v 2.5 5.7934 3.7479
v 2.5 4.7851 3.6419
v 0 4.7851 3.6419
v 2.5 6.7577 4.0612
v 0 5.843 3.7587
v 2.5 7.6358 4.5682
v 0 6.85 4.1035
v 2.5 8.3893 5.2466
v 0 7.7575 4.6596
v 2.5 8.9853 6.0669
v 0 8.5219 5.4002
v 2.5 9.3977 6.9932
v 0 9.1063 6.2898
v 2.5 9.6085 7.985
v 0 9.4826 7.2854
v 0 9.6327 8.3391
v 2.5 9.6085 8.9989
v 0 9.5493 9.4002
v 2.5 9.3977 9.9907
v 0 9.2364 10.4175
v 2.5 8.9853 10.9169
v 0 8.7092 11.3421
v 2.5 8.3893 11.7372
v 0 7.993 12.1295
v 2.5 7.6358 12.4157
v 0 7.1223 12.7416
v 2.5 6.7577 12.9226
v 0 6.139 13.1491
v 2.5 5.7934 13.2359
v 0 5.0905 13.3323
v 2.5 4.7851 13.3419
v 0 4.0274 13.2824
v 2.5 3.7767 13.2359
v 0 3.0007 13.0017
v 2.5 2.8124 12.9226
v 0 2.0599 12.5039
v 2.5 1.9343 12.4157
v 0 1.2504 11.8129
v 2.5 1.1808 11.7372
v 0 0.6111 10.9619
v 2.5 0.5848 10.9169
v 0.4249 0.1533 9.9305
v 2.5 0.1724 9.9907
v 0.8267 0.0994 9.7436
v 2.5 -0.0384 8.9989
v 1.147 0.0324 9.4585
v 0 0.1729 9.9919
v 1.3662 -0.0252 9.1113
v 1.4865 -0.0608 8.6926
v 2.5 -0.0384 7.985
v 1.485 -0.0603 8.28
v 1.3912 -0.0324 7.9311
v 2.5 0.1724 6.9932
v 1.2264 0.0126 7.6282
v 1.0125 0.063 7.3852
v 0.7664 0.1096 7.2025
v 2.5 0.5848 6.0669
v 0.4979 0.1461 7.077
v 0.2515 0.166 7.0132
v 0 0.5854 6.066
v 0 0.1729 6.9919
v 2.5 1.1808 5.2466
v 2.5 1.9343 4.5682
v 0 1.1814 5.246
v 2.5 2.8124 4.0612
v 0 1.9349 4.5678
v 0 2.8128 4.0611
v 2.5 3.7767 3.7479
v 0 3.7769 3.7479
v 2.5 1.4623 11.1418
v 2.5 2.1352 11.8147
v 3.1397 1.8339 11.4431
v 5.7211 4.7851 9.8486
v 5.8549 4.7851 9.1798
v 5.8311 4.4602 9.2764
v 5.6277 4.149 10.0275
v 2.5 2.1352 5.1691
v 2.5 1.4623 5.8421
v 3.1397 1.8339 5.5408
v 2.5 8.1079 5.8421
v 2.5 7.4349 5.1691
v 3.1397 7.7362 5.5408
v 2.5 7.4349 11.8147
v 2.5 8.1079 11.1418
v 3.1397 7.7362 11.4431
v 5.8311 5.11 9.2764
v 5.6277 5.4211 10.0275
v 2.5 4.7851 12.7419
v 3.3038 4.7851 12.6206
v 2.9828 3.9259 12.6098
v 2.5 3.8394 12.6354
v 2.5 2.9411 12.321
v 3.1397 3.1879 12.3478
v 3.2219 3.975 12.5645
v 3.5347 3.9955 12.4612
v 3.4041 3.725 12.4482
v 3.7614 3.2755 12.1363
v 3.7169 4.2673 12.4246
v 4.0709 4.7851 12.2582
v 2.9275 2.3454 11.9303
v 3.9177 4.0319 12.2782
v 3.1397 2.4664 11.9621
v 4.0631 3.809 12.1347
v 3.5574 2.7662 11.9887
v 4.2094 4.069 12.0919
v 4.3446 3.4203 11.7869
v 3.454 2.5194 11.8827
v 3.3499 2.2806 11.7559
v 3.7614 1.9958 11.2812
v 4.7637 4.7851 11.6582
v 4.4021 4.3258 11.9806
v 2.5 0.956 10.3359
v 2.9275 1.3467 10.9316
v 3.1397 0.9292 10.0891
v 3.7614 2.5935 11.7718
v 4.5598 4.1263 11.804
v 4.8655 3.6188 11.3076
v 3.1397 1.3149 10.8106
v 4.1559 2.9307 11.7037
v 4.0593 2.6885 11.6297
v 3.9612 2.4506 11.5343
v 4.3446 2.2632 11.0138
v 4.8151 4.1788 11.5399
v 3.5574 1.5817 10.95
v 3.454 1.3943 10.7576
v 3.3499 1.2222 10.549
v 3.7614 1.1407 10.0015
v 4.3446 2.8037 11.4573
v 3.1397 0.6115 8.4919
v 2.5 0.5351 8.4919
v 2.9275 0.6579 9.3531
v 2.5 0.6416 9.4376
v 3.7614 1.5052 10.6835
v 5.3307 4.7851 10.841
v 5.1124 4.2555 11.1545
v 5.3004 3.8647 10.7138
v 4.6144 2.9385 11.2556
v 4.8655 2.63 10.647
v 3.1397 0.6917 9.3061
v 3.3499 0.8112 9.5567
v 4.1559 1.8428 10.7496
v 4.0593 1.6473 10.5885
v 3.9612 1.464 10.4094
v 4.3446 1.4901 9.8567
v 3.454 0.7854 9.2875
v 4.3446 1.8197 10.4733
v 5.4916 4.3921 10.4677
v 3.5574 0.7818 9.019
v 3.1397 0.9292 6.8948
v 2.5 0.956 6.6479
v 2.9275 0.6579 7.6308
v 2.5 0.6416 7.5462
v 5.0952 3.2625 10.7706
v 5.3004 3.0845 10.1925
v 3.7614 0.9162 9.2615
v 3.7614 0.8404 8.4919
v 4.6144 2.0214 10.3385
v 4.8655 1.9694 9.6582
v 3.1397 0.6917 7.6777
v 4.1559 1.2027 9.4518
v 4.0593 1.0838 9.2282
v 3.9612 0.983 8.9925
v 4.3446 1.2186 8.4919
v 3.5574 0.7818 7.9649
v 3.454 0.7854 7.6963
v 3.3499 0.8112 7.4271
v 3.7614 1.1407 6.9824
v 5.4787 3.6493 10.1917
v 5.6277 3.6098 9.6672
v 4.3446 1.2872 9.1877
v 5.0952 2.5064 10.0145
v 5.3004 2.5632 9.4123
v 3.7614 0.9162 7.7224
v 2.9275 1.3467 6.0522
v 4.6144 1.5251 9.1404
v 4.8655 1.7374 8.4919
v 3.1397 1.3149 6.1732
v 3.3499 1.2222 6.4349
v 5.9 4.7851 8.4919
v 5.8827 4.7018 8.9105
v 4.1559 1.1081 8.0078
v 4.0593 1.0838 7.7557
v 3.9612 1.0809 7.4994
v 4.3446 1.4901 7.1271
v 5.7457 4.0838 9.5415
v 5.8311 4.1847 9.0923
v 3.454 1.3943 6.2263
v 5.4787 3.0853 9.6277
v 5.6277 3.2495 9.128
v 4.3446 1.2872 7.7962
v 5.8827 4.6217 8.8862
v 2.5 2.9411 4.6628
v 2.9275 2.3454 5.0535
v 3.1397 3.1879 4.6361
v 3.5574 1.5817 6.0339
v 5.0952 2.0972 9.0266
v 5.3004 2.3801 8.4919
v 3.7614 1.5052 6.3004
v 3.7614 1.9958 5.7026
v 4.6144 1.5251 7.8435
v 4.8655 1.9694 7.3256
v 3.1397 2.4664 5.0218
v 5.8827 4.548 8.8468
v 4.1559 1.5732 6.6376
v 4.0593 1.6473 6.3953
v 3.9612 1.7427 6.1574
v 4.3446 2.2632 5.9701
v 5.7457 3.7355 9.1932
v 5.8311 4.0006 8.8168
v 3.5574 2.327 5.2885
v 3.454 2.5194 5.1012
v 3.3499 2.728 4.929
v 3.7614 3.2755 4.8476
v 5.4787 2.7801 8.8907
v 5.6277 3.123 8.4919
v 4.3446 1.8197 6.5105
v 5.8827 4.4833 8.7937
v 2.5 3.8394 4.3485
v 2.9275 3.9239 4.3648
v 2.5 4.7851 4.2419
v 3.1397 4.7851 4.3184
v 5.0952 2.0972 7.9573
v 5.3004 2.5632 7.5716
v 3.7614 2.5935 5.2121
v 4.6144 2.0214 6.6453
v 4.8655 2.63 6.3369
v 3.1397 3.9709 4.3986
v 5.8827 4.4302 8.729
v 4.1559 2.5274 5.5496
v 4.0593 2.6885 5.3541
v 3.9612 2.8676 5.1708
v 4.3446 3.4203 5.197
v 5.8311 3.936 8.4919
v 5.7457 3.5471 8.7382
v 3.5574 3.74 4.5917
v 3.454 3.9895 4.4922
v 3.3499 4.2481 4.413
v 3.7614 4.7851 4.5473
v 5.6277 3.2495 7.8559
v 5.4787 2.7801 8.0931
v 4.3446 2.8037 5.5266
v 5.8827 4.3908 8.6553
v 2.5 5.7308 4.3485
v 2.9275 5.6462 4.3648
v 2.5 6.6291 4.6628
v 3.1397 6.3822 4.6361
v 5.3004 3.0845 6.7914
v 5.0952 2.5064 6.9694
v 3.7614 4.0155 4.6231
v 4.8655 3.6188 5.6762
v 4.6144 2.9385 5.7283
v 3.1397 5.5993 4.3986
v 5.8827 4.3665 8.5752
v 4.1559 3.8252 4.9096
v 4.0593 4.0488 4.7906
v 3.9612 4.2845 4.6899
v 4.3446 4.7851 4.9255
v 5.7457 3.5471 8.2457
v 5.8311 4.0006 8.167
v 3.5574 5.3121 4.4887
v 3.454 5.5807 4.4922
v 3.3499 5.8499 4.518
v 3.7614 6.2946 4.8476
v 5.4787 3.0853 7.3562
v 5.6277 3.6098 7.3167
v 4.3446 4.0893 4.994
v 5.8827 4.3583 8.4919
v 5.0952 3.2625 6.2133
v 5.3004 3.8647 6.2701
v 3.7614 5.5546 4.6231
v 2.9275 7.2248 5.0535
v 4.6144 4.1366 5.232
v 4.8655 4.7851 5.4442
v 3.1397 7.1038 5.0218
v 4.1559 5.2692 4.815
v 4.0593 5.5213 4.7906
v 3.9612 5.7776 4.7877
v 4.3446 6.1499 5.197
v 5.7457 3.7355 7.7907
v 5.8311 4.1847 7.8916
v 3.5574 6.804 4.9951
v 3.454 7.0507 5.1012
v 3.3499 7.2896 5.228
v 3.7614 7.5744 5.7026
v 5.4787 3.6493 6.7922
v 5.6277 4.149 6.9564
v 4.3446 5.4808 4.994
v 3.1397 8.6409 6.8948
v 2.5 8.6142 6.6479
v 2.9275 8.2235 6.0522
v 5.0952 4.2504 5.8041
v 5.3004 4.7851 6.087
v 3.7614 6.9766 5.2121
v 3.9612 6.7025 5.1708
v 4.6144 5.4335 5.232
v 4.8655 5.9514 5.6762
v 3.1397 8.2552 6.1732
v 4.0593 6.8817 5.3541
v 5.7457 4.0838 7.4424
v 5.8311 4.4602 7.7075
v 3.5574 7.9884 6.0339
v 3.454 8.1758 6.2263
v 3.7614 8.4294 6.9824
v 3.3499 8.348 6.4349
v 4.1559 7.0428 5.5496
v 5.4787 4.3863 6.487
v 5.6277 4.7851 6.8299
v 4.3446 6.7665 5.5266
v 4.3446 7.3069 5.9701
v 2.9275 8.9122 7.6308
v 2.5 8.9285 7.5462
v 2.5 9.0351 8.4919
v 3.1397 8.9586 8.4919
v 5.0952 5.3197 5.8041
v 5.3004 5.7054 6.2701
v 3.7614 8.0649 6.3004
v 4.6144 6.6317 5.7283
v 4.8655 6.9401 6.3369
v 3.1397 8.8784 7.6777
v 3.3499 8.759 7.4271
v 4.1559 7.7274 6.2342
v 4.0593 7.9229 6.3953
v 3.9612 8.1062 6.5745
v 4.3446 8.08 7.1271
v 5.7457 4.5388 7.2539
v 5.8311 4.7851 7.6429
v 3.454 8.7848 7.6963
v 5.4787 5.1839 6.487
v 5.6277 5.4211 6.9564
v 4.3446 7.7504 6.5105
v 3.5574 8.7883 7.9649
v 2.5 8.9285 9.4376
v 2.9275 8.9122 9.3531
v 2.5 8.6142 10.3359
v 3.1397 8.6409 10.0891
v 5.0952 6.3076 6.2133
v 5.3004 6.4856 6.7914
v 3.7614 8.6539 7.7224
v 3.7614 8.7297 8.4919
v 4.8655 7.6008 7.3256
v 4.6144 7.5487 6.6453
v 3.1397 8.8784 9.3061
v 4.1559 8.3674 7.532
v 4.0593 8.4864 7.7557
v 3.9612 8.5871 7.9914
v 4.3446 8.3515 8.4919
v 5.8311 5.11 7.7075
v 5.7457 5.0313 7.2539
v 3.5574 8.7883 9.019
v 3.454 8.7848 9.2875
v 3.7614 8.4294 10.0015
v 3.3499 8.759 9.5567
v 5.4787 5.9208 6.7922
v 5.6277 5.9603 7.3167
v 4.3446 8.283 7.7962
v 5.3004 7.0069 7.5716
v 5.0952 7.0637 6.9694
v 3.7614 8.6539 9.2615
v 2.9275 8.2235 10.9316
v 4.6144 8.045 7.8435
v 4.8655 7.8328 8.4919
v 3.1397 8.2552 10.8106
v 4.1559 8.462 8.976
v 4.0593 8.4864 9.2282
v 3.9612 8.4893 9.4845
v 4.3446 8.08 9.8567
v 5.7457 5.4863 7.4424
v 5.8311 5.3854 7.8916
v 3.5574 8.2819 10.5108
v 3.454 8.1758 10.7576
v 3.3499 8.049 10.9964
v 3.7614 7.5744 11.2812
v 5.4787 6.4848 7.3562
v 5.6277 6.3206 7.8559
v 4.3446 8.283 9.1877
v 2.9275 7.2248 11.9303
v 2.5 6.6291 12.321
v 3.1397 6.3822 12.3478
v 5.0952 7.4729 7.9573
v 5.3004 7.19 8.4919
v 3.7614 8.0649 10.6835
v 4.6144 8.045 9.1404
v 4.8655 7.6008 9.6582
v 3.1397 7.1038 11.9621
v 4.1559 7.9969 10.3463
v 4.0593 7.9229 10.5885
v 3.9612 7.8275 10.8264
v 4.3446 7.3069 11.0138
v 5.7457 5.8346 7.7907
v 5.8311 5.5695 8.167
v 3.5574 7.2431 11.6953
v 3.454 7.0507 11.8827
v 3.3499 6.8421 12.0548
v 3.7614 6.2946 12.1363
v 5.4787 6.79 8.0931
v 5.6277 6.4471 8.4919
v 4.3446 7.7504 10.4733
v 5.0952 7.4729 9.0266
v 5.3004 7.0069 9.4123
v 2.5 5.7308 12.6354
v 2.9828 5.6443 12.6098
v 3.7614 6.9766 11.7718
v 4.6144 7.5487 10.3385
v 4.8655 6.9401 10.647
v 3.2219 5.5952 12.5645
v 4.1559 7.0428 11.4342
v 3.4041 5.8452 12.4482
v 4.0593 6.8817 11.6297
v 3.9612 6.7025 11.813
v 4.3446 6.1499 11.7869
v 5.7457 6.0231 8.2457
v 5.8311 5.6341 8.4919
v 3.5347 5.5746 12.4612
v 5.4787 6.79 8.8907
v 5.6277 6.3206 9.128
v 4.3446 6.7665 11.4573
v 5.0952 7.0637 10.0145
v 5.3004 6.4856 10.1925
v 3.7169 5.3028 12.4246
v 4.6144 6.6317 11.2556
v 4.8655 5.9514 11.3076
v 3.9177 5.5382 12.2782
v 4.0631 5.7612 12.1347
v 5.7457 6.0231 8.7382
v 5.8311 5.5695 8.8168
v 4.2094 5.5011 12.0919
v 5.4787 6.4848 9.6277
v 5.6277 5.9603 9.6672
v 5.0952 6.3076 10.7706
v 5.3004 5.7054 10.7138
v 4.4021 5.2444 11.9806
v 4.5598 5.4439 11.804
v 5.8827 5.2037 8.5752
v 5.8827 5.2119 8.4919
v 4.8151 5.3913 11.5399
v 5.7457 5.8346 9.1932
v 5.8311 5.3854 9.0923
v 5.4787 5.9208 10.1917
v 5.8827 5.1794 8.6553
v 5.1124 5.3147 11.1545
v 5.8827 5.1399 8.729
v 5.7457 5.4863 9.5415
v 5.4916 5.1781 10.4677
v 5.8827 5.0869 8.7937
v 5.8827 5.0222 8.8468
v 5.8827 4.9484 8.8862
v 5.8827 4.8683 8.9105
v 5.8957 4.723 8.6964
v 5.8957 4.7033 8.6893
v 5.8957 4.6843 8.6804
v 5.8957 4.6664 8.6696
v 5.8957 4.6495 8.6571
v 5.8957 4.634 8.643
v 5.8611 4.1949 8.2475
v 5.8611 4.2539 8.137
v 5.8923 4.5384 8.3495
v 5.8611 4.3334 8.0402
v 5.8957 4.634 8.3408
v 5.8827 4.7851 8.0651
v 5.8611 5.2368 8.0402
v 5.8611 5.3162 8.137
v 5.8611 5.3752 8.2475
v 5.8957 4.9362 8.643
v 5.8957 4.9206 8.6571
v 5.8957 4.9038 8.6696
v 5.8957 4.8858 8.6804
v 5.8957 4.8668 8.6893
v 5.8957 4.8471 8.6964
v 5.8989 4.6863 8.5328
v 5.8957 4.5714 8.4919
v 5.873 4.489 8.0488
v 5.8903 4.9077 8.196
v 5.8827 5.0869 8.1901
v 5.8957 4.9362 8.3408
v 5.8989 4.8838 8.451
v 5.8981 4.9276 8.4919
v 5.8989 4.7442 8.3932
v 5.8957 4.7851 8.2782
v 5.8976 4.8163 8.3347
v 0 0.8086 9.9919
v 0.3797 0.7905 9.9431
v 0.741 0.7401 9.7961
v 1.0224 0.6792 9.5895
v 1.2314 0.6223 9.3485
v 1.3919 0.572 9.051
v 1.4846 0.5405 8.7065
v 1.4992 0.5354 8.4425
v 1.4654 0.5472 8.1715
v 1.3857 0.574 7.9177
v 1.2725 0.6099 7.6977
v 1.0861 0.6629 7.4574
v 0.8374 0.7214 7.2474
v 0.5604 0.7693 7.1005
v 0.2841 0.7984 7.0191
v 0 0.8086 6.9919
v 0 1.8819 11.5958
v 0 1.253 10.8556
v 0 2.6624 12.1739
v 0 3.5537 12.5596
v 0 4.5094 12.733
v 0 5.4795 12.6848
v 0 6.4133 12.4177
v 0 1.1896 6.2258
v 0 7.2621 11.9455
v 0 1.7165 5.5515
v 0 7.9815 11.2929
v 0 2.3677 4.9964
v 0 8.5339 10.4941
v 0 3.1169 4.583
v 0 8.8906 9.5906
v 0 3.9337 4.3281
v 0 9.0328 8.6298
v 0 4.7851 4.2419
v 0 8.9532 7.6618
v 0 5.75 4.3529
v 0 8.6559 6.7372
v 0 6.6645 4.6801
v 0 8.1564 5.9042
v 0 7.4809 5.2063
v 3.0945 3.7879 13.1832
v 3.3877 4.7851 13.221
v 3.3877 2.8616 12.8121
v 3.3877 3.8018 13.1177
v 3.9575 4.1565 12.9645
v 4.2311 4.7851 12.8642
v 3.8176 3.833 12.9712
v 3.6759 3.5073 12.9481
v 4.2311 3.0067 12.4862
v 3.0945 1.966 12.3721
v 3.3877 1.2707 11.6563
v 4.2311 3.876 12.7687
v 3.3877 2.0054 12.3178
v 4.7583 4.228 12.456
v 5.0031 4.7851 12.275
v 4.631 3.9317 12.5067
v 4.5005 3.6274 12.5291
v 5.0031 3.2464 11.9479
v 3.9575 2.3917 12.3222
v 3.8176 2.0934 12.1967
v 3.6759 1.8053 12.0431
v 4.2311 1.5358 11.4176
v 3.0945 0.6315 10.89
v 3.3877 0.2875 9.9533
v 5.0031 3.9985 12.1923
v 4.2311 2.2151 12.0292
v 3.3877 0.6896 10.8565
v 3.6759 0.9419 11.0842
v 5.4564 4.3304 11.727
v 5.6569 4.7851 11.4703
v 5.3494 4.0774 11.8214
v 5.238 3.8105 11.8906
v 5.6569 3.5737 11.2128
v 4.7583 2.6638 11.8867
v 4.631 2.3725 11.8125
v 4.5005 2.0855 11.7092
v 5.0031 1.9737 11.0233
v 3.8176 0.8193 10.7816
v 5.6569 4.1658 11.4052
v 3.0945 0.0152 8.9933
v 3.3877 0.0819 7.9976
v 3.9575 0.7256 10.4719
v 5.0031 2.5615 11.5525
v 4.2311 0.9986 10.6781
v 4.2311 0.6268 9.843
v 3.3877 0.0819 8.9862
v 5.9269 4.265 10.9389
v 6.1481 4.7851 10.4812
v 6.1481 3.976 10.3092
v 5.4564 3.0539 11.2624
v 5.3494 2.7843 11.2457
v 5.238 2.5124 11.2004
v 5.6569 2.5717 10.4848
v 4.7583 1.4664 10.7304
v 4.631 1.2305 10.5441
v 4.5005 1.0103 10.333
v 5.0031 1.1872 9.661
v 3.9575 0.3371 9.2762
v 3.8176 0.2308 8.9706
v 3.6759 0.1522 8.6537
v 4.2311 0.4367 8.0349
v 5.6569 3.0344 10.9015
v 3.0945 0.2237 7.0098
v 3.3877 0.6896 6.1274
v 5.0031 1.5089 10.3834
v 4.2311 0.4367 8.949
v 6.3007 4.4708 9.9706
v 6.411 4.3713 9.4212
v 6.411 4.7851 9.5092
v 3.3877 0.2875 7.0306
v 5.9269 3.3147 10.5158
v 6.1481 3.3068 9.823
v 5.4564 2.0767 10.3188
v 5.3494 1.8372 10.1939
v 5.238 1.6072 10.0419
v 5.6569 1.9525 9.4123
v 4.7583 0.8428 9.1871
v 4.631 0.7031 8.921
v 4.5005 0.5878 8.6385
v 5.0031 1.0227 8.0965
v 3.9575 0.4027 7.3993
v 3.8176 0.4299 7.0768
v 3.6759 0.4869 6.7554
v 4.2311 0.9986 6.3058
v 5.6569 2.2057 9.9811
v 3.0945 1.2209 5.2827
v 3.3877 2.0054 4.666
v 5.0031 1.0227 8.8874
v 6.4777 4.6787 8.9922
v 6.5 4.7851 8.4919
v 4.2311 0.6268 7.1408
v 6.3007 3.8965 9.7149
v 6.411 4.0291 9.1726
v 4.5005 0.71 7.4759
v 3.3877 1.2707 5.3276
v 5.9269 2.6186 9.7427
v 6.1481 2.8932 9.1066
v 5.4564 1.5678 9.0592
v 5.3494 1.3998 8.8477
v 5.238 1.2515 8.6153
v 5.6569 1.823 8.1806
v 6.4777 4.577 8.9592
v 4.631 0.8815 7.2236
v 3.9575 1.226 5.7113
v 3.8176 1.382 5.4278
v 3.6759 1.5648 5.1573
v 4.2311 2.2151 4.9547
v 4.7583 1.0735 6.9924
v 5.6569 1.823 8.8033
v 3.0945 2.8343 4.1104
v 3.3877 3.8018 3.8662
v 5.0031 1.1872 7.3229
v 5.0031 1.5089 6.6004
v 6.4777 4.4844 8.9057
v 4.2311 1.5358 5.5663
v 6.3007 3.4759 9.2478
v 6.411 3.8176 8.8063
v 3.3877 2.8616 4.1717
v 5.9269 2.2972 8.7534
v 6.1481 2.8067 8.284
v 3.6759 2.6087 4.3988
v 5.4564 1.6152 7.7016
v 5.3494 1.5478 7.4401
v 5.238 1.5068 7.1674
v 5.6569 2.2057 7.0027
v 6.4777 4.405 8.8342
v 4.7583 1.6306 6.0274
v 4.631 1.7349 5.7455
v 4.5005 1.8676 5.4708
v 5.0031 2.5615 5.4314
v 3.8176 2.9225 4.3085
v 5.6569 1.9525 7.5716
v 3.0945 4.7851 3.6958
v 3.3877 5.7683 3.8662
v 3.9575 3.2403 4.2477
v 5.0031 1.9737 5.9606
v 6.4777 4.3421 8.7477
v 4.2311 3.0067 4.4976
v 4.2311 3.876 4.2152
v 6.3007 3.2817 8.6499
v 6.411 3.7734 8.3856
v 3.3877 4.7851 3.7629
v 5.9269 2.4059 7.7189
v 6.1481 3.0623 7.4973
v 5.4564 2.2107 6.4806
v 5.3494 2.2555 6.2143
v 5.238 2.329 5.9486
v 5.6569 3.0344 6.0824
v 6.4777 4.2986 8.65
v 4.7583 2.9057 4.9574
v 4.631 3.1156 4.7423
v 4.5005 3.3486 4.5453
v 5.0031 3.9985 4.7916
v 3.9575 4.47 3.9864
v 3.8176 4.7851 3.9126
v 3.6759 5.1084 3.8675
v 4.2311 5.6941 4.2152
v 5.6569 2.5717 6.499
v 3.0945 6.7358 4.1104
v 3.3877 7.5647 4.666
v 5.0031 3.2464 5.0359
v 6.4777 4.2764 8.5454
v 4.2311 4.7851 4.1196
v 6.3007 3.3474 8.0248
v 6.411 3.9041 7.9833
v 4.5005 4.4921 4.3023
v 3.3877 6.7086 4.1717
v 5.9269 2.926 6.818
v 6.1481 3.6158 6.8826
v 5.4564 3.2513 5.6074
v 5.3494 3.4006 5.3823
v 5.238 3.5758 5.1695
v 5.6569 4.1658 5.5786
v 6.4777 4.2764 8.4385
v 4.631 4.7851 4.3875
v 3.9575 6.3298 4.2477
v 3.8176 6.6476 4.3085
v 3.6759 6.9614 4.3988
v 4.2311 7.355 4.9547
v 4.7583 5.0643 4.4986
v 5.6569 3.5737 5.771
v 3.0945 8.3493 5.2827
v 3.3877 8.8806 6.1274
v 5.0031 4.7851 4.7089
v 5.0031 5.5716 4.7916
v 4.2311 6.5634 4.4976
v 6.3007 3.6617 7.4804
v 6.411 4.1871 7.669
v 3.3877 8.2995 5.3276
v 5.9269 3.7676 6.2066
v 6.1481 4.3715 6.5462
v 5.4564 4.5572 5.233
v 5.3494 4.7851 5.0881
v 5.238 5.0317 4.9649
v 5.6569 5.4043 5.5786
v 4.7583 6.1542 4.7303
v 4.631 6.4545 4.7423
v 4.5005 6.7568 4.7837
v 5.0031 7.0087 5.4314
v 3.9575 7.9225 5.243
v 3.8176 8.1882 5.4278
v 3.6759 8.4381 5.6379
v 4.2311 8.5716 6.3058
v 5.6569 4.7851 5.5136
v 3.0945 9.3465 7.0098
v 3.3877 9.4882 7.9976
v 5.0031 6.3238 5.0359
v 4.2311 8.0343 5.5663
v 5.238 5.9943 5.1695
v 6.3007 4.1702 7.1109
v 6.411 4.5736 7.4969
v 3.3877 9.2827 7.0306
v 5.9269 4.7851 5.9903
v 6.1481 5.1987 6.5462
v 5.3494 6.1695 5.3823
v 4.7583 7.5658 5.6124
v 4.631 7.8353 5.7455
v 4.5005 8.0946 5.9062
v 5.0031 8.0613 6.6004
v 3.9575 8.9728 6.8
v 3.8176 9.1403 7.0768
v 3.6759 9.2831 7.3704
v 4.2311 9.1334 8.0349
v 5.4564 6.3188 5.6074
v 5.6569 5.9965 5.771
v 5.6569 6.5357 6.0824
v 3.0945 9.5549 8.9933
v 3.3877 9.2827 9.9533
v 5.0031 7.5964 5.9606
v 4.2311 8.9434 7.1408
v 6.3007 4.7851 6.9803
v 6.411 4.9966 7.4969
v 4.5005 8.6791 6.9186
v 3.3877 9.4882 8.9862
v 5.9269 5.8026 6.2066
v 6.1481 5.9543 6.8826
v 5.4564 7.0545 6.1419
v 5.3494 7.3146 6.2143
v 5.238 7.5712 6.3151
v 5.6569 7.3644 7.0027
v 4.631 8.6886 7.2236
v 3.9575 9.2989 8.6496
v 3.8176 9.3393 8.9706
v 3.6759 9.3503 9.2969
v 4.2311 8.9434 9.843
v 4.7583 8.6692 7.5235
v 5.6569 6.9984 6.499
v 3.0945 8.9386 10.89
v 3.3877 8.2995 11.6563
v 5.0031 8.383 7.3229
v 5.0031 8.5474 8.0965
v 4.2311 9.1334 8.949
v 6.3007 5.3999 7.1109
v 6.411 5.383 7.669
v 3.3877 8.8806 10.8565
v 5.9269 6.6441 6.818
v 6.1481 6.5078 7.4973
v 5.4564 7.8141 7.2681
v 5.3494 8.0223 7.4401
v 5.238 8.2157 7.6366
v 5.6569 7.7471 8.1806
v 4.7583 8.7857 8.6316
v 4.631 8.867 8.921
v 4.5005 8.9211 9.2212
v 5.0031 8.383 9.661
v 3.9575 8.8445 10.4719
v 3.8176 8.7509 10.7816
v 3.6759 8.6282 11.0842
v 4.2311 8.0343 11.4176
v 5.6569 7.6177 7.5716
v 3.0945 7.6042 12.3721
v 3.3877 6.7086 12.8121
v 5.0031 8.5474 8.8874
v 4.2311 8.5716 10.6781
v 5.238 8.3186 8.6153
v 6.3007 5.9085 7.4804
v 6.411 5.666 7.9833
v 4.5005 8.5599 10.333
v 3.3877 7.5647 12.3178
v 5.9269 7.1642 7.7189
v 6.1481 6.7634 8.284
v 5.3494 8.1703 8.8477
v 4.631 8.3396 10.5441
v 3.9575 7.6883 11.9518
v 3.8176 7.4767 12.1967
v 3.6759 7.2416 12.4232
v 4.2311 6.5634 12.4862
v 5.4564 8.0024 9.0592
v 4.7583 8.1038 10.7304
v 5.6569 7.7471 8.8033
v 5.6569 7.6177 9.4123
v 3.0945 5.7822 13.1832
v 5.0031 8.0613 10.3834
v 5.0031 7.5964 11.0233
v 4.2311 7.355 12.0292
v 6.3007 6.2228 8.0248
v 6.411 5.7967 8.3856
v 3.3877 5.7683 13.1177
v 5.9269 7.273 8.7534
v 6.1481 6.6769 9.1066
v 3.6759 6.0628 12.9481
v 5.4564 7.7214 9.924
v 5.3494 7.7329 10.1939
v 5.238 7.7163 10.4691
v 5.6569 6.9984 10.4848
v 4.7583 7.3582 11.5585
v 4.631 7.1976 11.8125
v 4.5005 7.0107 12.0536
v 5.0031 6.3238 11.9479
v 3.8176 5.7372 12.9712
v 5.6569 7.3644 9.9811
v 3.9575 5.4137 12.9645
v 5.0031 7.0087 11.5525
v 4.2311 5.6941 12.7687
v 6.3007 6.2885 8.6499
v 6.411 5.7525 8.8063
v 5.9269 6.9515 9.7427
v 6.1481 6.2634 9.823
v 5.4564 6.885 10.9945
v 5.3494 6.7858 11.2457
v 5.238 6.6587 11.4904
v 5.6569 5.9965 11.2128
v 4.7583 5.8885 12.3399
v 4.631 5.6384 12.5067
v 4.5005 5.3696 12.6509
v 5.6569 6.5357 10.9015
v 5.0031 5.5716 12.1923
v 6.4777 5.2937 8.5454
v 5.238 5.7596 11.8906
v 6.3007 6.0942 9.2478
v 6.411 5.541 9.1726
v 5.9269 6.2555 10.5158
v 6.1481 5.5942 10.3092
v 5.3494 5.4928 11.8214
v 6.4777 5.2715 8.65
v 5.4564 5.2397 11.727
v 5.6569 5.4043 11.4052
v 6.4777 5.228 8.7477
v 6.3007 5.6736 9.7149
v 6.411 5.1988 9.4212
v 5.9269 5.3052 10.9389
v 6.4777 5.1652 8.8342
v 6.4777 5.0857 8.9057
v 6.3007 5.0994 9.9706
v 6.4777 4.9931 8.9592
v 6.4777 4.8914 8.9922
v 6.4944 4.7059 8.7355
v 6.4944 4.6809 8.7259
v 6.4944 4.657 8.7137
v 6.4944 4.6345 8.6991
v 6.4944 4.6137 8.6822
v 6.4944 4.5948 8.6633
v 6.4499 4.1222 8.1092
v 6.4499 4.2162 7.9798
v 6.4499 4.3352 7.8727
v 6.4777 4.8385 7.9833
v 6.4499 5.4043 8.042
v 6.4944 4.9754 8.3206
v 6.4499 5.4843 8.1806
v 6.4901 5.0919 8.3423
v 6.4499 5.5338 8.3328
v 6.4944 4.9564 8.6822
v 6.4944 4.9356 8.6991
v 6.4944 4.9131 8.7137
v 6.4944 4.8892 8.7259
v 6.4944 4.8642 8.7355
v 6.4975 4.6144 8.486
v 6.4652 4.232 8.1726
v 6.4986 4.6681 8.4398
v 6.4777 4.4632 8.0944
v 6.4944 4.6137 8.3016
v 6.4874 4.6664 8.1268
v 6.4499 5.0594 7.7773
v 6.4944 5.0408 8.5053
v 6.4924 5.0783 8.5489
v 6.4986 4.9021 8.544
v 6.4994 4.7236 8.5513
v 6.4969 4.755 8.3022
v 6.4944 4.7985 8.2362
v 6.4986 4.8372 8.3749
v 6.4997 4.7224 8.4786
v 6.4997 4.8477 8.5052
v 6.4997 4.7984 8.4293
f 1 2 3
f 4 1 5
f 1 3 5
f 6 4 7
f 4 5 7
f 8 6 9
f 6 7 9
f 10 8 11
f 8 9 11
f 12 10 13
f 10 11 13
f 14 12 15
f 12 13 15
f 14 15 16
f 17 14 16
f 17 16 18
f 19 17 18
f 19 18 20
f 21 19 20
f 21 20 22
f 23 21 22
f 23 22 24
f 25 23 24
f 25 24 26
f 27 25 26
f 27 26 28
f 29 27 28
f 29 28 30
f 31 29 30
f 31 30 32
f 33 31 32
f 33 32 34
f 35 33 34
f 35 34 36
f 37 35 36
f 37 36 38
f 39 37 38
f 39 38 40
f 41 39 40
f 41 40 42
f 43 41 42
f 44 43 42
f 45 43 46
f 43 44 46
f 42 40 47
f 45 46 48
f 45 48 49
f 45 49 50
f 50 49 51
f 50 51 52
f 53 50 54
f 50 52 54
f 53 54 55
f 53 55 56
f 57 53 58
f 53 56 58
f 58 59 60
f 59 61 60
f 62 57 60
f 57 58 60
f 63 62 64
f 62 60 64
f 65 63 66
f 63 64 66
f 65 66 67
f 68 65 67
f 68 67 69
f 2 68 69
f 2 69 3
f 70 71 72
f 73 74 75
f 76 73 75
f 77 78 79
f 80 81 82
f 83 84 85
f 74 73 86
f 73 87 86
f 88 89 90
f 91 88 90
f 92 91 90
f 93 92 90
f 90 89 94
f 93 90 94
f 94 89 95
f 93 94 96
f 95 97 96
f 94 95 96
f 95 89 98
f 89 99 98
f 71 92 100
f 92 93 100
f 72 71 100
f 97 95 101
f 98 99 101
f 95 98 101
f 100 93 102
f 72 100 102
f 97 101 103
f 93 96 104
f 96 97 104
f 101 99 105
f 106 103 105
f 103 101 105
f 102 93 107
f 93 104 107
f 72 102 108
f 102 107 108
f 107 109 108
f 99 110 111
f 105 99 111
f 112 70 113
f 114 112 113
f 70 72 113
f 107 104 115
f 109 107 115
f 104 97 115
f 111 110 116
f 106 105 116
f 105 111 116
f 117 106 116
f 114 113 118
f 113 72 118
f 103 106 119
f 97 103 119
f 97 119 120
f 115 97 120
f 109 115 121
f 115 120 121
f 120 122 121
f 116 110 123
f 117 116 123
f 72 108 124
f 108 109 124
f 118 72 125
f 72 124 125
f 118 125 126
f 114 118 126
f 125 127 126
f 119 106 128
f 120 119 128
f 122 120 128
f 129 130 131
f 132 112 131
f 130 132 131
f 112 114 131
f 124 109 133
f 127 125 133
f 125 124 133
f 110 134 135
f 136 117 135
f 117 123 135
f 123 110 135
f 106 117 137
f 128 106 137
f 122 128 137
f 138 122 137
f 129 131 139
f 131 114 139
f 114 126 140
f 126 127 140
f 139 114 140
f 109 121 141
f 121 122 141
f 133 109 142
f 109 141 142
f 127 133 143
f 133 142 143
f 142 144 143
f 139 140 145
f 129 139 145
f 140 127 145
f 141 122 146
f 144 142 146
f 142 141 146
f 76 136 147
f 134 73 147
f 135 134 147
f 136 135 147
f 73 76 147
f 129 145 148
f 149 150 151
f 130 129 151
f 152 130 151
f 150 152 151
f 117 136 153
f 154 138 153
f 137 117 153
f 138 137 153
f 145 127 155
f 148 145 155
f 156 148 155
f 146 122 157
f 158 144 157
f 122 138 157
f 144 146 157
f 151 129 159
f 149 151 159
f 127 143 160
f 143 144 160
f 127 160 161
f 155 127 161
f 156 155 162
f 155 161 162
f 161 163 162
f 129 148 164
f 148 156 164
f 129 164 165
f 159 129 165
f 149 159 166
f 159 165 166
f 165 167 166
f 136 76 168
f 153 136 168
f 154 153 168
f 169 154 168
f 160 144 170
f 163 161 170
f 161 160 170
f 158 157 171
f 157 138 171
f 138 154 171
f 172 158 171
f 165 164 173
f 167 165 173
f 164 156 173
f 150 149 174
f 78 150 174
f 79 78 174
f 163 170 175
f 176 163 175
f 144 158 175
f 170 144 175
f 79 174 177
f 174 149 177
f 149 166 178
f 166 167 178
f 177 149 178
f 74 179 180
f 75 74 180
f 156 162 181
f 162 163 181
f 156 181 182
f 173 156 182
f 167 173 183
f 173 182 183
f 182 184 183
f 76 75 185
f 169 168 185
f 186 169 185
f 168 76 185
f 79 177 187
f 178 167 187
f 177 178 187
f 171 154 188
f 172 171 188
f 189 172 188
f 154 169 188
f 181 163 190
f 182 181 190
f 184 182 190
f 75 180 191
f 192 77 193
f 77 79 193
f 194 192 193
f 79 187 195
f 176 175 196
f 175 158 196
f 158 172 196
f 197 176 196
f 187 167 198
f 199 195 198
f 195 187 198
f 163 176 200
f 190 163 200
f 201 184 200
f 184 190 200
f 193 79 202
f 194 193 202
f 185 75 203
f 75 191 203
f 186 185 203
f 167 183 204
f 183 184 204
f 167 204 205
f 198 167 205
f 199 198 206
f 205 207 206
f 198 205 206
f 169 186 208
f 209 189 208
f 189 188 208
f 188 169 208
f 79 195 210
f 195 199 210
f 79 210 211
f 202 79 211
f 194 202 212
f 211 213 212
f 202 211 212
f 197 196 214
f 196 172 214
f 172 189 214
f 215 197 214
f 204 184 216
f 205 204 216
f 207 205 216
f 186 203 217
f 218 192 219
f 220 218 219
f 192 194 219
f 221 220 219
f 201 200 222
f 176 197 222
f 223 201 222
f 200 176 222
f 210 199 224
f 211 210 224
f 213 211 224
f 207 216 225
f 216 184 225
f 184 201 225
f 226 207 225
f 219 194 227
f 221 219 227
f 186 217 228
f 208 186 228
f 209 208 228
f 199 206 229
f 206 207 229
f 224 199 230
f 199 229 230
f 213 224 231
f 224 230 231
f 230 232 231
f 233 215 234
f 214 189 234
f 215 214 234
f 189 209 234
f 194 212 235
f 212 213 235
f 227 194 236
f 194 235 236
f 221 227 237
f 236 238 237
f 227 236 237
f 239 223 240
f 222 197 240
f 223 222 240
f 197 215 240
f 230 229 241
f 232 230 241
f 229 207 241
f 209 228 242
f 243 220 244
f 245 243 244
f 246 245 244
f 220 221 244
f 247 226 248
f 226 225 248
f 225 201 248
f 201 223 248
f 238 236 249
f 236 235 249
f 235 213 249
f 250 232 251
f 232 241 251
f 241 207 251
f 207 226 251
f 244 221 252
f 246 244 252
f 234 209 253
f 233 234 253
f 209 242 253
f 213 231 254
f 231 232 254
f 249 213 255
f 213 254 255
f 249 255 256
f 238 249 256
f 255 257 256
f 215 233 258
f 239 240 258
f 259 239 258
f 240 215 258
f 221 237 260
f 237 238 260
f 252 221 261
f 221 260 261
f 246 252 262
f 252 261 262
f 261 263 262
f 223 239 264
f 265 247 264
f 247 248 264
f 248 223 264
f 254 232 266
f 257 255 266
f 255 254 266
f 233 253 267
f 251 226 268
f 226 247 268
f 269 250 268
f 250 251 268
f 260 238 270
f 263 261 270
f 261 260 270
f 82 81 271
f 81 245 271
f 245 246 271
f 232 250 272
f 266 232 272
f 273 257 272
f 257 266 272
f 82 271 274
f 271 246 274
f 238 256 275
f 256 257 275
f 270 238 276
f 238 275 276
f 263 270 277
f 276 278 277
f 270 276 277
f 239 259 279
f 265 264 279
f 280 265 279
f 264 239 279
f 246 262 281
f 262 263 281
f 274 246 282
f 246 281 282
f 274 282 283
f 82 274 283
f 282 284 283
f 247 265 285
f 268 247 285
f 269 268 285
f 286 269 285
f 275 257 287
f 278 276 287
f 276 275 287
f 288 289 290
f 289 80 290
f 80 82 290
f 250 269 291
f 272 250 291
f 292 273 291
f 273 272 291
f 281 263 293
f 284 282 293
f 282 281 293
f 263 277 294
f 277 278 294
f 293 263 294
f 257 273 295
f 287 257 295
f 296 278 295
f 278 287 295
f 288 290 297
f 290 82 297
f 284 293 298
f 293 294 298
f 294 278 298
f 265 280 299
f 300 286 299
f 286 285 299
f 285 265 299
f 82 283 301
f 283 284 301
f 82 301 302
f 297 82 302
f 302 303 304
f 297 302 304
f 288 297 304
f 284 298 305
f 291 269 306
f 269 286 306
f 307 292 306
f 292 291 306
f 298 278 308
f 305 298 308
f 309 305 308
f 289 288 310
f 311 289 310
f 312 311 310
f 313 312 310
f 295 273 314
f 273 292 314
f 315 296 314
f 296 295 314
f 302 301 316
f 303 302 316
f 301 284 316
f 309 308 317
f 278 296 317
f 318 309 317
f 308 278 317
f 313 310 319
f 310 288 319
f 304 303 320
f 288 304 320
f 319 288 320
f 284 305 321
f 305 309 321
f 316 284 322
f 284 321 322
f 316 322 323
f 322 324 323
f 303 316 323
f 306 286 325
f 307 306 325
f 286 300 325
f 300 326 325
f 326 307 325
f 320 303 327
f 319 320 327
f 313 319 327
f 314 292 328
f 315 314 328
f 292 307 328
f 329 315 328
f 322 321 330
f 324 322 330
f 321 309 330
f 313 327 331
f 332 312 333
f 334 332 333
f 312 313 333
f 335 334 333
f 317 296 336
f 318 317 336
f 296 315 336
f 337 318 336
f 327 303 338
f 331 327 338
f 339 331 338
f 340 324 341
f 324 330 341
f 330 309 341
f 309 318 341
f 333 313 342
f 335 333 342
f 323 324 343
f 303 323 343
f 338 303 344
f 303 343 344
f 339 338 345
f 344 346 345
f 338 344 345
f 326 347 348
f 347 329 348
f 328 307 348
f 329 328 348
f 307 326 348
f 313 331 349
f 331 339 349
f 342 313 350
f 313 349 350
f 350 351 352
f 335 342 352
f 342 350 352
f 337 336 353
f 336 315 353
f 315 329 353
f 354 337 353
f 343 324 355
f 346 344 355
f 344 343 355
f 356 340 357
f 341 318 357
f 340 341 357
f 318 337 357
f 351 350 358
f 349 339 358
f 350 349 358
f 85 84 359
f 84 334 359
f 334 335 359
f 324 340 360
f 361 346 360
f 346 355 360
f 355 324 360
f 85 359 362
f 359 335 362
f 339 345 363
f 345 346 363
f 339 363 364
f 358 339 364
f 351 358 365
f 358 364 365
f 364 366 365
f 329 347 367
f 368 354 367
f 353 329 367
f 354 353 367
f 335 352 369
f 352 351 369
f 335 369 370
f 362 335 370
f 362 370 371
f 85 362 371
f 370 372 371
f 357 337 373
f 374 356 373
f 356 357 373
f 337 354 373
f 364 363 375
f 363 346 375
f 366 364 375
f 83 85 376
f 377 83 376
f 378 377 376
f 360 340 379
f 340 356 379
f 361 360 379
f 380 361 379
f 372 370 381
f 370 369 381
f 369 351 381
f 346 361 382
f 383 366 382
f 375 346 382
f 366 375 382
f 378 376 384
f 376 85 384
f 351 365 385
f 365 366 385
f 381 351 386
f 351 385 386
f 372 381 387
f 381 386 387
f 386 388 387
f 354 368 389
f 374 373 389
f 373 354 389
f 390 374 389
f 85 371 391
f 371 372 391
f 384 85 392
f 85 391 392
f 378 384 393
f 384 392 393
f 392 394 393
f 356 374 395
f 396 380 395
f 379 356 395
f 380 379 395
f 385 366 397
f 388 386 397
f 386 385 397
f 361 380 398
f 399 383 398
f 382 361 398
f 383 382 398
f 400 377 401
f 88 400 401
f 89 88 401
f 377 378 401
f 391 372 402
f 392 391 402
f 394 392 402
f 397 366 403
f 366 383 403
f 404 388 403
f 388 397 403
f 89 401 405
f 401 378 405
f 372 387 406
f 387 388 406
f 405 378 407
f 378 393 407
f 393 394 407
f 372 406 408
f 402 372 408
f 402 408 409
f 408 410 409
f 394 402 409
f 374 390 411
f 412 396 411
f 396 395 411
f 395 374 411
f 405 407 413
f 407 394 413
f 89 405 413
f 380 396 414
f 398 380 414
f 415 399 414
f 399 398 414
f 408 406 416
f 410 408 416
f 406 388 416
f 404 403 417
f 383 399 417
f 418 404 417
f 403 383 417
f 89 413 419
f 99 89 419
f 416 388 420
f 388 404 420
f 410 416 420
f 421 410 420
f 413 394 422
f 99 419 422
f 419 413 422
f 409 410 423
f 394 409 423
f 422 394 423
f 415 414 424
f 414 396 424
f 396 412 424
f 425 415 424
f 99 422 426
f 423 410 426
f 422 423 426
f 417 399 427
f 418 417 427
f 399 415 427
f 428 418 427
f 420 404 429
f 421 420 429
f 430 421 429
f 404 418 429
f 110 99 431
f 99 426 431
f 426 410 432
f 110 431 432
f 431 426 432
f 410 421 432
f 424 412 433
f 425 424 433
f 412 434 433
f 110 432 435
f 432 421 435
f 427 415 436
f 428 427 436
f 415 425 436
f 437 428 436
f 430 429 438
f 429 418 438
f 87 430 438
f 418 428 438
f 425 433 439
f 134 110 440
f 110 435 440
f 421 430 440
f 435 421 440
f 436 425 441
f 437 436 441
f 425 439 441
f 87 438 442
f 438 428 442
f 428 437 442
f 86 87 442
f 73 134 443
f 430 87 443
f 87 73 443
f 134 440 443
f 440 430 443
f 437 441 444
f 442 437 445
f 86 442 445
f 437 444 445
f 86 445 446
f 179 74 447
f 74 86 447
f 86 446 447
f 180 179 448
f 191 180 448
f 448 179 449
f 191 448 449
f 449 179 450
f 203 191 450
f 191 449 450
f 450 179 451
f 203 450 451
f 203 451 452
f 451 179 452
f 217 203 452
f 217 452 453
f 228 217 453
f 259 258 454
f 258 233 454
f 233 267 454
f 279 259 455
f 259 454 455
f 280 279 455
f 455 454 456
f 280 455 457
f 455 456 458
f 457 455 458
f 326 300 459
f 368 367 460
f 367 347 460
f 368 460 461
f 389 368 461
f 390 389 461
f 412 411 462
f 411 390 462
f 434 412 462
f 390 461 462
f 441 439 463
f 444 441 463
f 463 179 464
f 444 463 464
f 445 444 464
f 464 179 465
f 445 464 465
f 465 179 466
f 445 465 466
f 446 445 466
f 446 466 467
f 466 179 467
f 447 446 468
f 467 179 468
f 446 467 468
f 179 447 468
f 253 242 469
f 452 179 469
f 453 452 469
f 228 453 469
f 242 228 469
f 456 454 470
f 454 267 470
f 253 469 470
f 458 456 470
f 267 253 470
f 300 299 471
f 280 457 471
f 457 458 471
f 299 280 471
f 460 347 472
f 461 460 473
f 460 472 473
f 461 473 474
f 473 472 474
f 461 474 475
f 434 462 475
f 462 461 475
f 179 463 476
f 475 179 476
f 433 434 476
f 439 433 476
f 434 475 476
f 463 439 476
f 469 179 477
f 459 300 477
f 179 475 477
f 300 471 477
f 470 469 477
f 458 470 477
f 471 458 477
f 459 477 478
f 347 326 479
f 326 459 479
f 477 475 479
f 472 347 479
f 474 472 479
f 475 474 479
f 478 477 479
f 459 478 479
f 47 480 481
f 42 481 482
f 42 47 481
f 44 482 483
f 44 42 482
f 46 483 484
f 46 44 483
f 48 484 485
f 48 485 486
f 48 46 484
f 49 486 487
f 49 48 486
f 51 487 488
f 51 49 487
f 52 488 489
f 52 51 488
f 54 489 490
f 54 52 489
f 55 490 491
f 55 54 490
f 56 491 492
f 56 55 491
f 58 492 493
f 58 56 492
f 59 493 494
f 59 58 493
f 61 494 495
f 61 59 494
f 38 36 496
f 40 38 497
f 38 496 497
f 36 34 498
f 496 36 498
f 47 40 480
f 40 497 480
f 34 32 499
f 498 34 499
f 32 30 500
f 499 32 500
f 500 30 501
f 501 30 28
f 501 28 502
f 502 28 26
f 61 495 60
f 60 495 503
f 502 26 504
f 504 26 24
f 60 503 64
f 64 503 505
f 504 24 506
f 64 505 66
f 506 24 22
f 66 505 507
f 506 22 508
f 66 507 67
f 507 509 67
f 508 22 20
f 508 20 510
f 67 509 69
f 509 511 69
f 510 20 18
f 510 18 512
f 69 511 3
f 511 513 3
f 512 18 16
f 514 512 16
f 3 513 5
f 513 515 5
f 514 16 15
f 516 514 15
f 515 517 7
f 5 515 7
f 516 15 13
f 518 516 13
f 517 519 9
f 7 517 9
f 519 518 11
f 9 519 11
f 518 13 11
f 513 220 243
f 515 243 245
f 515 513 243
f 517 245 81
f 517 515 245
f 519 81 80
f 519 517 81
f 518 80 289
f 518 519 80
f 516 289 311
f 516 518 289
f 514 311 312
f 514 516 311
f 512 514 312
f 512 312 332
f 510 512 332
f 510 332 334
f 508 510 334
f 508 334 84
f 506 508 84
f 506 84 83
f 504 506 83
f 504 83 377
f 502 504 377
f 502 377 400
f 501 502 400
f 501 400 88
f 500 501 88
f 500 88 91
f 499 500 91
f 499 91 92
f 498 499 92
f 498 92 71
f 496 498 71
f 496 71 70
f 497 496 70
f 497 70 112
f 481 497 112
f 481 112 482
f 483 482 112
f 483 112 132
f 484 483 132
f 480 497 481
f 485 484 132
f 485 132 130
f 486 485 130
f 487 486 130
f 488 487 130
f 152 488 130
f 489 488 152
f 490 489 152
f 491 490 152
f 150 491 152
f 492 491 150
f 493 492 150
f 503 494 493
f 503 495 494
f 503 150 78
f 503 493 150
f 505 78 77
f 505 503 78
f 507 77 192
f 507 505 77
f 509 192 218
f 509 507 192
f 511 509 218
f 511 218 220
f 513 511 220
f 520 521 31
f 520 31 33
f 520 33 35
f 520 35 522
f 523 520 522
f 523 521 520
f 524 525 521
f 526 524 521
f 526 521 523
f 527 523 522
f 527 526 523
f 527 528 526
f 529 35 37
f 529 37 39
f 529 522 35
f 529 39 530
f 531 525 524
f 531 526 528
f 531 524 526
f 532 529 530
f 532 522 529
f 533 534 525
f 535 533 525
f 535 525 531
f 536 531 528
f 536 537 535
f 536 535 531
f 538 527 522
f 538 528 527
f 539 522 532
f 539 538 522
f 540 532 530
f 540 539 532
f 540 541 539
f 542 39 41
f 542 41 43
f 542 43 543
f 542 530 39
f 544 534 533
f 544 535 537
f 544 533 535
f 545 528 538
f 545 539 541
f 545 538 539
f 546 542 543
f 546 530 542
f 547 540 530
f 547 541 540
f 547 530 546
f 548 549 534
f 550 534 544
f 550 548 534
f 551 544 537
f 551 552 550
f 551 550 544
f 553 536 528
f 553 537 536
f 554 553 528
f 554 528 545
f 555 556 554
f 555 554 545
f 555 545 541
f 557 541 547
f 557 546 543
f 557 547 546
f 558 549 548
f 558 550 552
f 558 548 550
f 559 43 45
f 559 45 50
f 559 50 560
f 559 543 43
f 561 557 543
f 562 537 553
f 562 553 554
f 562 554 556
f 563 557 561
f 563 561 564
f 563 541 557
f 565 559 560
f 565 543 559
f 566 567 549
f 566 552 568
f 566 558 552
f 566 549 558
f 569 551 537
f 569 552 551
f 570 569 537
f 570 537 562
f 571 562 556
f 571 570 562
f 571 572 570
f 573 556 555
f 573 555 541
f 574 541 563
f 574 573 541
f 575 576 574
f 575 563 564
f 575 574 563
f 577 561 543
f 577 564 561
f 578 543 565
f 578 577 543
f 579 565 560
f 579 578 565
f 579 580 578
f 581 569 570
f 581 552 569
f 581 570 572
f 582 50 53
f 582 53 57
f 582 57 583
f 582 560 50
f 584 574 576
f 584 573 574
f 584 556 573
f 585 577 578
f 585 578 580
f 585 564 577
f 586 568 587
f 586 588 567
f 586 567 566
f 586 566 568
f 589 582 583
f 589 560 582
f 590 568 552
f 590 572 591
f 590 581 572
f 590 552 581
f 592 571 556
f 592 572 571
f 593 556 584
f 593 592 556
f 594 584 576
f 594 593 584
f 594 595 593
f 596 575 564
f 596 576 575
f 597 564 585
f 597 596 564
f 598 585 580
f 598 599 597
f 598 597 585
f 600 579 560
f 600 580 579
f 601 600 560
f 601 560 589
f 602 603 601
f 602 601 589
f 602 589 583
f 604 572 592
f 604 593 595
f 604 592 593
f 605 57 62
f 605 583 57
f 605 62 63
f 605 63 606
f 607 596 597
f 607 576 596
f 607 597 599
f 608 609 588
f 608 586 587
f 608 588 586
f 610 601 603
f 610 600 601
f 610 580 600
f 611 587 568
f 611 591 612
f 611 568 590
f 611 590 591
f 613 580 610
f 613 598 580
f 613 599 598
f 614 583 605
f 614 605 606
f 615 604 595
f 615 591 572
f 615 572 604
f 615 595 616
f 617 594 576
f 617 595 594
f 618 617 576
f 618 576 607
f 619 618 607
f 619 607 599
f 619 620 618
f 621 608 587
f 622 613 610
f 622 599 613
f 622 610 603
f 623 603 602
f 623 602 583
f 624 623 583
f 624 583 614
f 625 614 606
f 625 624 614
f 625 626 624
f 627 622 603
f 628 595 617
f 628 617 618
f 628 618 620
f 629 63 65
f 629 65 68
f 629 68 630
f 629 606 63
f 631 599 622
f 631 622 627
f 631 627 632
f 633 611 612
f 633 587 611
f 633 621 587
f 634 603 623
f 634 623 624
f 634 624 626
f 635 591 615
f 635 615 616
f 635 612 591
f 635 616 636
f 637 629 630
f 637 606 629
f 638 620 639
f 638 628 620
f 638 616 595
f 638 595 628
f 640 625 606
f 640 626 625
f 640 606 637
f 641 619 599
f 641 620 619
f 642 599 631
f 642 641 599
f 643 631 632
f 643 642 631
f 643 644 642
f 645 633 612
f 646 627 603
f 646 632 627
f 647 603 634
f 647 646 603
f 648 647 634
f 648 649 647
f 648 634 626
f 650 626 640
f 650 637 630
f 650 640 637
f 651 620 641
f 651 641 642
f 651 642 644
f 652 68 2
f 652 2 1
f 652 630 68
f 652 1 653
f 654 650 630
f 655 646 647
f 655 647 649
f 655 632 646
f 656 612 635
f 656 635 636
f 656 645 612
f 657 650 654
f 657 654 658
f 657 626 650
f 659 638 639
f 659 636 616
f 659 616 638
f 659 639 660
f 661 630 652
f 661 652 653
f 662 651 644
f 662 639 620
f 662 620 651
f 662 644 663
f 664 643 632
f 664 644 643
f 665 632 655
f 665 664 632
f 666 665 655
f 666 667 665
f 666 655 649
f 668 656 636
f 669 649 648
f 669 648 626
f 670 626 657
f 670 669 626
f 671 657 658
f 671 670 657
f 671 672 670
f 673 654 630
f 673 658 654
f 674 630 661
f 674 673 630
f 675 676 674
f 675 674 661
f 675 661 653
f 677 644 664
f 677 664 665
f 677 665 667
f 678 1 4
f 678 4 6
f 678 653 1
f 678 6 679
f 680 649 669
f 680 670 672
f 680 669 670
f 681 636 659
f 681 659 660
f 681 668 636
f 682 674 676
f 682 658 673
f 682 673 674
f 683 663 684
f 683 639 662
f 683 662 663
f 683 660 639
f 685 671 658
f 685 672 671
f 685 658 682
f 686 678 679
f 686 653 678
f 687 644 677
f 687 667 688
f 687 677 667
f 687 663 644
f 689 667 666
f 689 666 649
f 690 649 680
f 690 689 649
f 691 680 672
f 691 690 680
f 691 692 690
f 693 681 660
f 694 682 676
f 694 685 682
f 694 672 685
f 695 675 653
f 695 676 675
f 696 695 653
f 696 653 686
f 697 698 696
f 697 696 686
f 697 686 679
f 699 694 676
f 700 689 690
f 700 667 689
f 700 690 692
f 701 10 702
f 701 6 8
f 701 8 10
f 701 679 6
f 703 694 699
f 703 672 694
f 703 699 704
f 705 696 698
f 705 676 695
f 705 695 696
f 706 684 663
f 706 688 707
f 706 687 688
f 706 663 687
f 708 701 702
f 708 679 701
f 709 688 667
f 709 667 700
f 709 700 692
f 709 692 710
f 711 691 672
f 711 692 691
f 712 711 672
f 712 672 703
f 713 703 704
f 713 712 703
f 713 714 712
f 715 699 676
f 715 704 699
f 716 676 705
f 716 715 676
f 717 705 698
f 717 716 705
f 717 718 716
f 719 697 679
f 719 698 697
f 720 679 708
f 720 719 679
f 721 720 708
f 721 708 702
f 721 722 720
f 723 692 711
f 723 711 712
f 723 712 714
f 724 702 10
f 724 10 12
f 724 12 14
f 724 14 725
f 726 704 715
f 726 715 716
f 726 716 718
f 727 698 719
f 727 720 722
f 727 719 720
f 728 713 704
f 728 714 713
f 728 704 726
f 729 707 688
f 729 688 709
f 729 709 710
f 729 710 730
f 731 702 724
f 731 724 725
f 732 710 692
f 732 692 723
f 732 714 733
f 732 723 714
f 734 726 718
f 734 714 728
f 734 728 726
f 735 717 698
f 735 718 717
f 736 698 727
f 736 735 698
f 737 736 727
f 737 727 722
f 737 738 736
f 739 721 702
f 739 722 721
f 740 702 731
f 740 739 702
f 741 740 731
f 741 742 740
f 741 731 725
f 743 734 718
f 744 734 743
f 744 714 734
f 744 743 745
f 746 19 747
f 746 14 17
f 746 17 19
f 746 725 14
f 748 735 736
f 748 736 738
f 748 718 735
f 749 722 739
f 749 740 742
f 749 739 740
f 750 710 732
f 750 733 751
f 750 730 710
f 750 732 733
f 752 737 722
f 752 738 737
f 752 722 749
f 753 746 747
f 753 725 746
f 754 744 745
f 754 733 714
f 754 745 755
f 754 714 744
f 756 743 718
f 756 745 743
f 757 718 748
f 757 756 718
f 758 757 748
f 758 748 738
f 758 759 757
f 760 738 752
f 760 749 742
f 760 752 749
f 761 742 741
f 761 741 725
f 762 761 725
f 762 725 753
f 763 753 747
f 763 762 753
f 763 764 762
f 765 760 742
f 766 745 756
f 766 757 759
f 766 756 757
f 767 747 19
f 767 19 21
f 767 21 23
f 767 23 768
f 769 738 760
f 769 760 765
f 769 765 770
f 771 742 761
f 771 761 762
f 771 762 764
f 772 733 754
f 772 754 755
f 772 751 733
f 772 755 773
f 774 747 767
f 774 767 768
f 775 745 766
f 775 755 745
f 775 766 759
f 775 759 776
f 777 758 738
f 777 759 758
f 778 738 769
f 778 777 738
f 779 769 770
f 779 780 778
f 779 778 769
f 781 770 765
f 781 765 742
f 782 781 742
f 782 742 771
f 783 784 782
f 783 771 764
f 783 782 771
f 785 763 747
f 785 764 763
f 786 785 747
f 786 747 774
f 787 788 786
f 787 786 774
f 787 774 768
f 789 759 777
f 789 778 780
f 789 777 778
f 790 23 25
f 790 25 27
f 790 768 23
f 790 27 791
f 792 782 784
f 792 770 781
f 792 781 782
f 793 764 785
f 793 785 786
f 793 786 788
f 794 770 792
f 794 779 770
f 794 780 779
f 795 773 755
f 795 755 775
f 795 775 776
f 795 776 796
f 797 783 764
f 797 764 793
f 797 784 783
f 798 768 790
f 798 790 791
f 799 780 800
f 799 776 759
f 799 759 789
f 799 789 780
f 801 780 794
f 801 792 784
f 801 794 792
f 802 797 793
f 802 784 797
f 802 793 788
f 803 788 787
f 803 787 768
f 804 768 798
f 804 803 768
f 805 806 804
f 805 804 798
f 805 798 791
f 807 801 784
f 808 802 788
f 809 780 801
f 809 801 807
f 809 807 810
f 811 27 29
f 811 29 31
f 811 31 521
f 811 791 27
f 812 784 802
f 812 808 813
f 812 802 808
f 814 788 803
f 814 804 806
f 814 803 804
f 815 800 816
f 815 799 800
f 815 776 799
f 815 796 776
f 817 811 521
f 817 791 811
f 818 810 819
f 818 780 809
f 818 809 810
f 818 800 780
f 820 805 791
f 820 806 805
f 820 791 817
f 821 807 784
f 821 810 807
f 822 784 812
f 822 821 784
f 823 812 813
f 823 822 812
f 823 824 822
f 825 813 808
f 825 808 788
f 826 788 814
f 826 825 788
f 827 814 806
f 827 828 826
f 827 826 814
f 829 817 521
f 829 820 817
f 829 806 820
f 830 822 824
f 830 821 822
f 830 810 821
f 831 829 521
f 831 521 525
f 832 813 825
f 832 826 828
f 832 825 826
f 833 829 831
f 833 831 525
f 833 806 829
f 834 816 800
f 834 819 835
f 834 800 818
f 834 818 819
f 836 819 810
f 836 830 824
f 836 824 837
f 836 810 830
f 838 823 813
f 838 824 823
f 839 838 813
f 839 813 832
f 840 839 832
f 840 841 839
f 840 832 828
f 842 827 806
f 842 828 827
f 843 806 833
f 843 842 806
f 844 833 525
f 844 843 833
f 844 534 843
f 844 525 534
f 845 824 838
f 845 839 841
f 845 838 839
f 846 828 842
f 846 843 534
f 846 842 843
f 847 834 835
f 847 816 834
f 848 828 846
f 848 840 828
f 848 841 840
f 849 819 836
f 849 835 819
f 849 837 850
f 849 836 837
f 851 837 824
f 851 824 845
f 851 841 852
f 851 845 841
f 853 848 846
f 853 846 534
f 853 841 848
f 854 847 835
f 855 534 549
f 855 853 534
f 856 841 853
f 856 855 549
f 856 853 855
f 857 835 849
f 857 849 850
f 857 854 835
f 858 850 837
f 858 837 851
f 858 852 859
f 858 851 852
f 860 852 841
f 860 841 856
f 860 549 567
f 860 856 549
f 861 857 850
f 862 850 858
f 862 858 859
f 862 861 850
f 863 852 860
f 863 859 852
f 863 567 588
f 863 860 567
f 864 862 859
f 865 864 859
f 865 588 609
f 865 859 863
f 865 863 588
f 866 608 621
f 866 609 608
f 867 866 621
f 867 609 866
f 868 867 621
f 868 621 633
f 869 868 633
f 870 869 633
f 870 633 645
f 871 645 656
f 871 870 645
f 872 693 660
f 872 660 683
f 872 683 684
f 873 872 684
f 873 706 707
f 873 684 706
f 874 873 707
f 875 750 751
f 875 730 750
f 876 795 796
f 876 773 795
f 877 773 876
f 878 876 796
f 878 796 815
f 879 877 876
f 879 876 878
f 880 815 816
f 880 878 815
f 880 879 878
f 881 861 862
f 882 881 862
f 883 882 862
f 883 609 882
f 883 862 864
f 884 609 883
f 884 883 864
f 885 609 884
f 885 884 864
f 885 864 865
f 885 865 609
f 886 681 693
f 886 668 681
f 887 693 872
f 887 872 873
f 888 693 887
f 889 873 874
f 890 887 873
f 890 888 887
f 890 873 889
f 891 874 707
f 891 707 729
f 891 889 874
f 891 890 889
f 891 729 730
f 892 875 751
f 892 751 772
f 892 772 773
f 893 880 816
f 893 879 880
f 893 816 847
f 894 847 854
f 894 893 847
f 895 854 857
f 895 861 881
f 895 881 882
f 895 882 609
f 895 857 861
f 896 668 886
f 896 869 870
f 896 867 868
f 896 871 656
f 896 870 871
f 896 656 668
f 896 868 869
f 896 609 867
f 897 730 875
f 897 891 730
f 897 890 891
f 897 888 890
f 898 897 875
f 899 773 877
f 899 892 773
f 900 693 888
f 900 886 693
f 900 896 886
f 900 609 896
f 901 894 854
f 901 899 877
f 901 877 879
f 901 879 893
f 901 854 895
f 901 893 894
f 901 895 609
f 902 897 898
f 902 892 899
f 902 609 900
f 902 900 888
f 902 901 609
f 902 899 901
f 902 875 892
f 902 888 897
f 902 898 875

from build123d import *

# Parameters (mm, degrees)
SKETCH1_R               = 4.85
BOSS_EXTRUDE1_DEPTH     = 2.5
DOME1_FACE_RADIUS       = 4.85
DOME1_HEIGHT            = 4
SHELL1_T                = -0.6
CUT_EXTRUDE2_DEPTH      = 4
CUT_EXTRUDE2_DEPTH_BACK = 4
SKETCH4_R               = 1.5


with BuildPart() as part:
    # Sketch1 → Boss-Extrude1 (new body)
    with BuildSketch(Plane(origin=(0, 0, 0), x_dir=(0, 0, -1), z_dir=(1, 0, 0))):
        with Locations((-8.491927182, 4.785070814)):
            Circle(SKETCH1_R)
    extrude(amount=BOSS_EXTRUDE1_DEPTH)

    # Dome1: an elliptical dome of height H over a round flat face of radius A is half a spheroid: the quarter ellipse of half axes A and H revolved about the face's axis
    with BuildSketch(Plane((2.5, 4.785070814, 8.491927182), x_dir=(0, 0, 1), z_dir=(0, 1, 0)), mode=Mode.PRIVATE) as dome1_quarter:
        Ellipse(DOME1_FACE_RADIUS, DOME1_HEIGHT)
        Rectangle(DOME1_FACE_RADIUS, DOME1_HEIGHT, align=(Align.MIN, Align.MIN), mode=Mode.INTERSECT)
    revolve(dome1_quarter.sketch, axis=Axis((2.5, 4.785070814, 8.491927182), (1, 0, 0)))

    # Shell1
    shell1_openings = [part.faces().sort_by_distance(p)[0] for p in [
        (0, 4.785070814, 8.491927182),
    ]]
    offset(amount=SHELL1_T, openings=shell1_openings, kind=Kind.INTERSECTION)

    # Sketch4 → Cut-Extrude2 (cut, two sides: drawn at the far end of the back side and taken through both)
    with BuildSketch(Plane(origin=(0, 0, 0), x_dir=(1, 0, 0), z_dir=(0, 1, 0)).offset(-CUT_EXTRUDE2_DEPTH_BACK)):
        with Locations((0, -8.491927182)):
            Circle(SKETCH4_R)
    extrude(amount=CUT_EXTRUDE2_DEPTH + CUT_EXTRUDE2_DEPTH_BACK, mode=Mode.SUBTRACT)


solid = part.part
